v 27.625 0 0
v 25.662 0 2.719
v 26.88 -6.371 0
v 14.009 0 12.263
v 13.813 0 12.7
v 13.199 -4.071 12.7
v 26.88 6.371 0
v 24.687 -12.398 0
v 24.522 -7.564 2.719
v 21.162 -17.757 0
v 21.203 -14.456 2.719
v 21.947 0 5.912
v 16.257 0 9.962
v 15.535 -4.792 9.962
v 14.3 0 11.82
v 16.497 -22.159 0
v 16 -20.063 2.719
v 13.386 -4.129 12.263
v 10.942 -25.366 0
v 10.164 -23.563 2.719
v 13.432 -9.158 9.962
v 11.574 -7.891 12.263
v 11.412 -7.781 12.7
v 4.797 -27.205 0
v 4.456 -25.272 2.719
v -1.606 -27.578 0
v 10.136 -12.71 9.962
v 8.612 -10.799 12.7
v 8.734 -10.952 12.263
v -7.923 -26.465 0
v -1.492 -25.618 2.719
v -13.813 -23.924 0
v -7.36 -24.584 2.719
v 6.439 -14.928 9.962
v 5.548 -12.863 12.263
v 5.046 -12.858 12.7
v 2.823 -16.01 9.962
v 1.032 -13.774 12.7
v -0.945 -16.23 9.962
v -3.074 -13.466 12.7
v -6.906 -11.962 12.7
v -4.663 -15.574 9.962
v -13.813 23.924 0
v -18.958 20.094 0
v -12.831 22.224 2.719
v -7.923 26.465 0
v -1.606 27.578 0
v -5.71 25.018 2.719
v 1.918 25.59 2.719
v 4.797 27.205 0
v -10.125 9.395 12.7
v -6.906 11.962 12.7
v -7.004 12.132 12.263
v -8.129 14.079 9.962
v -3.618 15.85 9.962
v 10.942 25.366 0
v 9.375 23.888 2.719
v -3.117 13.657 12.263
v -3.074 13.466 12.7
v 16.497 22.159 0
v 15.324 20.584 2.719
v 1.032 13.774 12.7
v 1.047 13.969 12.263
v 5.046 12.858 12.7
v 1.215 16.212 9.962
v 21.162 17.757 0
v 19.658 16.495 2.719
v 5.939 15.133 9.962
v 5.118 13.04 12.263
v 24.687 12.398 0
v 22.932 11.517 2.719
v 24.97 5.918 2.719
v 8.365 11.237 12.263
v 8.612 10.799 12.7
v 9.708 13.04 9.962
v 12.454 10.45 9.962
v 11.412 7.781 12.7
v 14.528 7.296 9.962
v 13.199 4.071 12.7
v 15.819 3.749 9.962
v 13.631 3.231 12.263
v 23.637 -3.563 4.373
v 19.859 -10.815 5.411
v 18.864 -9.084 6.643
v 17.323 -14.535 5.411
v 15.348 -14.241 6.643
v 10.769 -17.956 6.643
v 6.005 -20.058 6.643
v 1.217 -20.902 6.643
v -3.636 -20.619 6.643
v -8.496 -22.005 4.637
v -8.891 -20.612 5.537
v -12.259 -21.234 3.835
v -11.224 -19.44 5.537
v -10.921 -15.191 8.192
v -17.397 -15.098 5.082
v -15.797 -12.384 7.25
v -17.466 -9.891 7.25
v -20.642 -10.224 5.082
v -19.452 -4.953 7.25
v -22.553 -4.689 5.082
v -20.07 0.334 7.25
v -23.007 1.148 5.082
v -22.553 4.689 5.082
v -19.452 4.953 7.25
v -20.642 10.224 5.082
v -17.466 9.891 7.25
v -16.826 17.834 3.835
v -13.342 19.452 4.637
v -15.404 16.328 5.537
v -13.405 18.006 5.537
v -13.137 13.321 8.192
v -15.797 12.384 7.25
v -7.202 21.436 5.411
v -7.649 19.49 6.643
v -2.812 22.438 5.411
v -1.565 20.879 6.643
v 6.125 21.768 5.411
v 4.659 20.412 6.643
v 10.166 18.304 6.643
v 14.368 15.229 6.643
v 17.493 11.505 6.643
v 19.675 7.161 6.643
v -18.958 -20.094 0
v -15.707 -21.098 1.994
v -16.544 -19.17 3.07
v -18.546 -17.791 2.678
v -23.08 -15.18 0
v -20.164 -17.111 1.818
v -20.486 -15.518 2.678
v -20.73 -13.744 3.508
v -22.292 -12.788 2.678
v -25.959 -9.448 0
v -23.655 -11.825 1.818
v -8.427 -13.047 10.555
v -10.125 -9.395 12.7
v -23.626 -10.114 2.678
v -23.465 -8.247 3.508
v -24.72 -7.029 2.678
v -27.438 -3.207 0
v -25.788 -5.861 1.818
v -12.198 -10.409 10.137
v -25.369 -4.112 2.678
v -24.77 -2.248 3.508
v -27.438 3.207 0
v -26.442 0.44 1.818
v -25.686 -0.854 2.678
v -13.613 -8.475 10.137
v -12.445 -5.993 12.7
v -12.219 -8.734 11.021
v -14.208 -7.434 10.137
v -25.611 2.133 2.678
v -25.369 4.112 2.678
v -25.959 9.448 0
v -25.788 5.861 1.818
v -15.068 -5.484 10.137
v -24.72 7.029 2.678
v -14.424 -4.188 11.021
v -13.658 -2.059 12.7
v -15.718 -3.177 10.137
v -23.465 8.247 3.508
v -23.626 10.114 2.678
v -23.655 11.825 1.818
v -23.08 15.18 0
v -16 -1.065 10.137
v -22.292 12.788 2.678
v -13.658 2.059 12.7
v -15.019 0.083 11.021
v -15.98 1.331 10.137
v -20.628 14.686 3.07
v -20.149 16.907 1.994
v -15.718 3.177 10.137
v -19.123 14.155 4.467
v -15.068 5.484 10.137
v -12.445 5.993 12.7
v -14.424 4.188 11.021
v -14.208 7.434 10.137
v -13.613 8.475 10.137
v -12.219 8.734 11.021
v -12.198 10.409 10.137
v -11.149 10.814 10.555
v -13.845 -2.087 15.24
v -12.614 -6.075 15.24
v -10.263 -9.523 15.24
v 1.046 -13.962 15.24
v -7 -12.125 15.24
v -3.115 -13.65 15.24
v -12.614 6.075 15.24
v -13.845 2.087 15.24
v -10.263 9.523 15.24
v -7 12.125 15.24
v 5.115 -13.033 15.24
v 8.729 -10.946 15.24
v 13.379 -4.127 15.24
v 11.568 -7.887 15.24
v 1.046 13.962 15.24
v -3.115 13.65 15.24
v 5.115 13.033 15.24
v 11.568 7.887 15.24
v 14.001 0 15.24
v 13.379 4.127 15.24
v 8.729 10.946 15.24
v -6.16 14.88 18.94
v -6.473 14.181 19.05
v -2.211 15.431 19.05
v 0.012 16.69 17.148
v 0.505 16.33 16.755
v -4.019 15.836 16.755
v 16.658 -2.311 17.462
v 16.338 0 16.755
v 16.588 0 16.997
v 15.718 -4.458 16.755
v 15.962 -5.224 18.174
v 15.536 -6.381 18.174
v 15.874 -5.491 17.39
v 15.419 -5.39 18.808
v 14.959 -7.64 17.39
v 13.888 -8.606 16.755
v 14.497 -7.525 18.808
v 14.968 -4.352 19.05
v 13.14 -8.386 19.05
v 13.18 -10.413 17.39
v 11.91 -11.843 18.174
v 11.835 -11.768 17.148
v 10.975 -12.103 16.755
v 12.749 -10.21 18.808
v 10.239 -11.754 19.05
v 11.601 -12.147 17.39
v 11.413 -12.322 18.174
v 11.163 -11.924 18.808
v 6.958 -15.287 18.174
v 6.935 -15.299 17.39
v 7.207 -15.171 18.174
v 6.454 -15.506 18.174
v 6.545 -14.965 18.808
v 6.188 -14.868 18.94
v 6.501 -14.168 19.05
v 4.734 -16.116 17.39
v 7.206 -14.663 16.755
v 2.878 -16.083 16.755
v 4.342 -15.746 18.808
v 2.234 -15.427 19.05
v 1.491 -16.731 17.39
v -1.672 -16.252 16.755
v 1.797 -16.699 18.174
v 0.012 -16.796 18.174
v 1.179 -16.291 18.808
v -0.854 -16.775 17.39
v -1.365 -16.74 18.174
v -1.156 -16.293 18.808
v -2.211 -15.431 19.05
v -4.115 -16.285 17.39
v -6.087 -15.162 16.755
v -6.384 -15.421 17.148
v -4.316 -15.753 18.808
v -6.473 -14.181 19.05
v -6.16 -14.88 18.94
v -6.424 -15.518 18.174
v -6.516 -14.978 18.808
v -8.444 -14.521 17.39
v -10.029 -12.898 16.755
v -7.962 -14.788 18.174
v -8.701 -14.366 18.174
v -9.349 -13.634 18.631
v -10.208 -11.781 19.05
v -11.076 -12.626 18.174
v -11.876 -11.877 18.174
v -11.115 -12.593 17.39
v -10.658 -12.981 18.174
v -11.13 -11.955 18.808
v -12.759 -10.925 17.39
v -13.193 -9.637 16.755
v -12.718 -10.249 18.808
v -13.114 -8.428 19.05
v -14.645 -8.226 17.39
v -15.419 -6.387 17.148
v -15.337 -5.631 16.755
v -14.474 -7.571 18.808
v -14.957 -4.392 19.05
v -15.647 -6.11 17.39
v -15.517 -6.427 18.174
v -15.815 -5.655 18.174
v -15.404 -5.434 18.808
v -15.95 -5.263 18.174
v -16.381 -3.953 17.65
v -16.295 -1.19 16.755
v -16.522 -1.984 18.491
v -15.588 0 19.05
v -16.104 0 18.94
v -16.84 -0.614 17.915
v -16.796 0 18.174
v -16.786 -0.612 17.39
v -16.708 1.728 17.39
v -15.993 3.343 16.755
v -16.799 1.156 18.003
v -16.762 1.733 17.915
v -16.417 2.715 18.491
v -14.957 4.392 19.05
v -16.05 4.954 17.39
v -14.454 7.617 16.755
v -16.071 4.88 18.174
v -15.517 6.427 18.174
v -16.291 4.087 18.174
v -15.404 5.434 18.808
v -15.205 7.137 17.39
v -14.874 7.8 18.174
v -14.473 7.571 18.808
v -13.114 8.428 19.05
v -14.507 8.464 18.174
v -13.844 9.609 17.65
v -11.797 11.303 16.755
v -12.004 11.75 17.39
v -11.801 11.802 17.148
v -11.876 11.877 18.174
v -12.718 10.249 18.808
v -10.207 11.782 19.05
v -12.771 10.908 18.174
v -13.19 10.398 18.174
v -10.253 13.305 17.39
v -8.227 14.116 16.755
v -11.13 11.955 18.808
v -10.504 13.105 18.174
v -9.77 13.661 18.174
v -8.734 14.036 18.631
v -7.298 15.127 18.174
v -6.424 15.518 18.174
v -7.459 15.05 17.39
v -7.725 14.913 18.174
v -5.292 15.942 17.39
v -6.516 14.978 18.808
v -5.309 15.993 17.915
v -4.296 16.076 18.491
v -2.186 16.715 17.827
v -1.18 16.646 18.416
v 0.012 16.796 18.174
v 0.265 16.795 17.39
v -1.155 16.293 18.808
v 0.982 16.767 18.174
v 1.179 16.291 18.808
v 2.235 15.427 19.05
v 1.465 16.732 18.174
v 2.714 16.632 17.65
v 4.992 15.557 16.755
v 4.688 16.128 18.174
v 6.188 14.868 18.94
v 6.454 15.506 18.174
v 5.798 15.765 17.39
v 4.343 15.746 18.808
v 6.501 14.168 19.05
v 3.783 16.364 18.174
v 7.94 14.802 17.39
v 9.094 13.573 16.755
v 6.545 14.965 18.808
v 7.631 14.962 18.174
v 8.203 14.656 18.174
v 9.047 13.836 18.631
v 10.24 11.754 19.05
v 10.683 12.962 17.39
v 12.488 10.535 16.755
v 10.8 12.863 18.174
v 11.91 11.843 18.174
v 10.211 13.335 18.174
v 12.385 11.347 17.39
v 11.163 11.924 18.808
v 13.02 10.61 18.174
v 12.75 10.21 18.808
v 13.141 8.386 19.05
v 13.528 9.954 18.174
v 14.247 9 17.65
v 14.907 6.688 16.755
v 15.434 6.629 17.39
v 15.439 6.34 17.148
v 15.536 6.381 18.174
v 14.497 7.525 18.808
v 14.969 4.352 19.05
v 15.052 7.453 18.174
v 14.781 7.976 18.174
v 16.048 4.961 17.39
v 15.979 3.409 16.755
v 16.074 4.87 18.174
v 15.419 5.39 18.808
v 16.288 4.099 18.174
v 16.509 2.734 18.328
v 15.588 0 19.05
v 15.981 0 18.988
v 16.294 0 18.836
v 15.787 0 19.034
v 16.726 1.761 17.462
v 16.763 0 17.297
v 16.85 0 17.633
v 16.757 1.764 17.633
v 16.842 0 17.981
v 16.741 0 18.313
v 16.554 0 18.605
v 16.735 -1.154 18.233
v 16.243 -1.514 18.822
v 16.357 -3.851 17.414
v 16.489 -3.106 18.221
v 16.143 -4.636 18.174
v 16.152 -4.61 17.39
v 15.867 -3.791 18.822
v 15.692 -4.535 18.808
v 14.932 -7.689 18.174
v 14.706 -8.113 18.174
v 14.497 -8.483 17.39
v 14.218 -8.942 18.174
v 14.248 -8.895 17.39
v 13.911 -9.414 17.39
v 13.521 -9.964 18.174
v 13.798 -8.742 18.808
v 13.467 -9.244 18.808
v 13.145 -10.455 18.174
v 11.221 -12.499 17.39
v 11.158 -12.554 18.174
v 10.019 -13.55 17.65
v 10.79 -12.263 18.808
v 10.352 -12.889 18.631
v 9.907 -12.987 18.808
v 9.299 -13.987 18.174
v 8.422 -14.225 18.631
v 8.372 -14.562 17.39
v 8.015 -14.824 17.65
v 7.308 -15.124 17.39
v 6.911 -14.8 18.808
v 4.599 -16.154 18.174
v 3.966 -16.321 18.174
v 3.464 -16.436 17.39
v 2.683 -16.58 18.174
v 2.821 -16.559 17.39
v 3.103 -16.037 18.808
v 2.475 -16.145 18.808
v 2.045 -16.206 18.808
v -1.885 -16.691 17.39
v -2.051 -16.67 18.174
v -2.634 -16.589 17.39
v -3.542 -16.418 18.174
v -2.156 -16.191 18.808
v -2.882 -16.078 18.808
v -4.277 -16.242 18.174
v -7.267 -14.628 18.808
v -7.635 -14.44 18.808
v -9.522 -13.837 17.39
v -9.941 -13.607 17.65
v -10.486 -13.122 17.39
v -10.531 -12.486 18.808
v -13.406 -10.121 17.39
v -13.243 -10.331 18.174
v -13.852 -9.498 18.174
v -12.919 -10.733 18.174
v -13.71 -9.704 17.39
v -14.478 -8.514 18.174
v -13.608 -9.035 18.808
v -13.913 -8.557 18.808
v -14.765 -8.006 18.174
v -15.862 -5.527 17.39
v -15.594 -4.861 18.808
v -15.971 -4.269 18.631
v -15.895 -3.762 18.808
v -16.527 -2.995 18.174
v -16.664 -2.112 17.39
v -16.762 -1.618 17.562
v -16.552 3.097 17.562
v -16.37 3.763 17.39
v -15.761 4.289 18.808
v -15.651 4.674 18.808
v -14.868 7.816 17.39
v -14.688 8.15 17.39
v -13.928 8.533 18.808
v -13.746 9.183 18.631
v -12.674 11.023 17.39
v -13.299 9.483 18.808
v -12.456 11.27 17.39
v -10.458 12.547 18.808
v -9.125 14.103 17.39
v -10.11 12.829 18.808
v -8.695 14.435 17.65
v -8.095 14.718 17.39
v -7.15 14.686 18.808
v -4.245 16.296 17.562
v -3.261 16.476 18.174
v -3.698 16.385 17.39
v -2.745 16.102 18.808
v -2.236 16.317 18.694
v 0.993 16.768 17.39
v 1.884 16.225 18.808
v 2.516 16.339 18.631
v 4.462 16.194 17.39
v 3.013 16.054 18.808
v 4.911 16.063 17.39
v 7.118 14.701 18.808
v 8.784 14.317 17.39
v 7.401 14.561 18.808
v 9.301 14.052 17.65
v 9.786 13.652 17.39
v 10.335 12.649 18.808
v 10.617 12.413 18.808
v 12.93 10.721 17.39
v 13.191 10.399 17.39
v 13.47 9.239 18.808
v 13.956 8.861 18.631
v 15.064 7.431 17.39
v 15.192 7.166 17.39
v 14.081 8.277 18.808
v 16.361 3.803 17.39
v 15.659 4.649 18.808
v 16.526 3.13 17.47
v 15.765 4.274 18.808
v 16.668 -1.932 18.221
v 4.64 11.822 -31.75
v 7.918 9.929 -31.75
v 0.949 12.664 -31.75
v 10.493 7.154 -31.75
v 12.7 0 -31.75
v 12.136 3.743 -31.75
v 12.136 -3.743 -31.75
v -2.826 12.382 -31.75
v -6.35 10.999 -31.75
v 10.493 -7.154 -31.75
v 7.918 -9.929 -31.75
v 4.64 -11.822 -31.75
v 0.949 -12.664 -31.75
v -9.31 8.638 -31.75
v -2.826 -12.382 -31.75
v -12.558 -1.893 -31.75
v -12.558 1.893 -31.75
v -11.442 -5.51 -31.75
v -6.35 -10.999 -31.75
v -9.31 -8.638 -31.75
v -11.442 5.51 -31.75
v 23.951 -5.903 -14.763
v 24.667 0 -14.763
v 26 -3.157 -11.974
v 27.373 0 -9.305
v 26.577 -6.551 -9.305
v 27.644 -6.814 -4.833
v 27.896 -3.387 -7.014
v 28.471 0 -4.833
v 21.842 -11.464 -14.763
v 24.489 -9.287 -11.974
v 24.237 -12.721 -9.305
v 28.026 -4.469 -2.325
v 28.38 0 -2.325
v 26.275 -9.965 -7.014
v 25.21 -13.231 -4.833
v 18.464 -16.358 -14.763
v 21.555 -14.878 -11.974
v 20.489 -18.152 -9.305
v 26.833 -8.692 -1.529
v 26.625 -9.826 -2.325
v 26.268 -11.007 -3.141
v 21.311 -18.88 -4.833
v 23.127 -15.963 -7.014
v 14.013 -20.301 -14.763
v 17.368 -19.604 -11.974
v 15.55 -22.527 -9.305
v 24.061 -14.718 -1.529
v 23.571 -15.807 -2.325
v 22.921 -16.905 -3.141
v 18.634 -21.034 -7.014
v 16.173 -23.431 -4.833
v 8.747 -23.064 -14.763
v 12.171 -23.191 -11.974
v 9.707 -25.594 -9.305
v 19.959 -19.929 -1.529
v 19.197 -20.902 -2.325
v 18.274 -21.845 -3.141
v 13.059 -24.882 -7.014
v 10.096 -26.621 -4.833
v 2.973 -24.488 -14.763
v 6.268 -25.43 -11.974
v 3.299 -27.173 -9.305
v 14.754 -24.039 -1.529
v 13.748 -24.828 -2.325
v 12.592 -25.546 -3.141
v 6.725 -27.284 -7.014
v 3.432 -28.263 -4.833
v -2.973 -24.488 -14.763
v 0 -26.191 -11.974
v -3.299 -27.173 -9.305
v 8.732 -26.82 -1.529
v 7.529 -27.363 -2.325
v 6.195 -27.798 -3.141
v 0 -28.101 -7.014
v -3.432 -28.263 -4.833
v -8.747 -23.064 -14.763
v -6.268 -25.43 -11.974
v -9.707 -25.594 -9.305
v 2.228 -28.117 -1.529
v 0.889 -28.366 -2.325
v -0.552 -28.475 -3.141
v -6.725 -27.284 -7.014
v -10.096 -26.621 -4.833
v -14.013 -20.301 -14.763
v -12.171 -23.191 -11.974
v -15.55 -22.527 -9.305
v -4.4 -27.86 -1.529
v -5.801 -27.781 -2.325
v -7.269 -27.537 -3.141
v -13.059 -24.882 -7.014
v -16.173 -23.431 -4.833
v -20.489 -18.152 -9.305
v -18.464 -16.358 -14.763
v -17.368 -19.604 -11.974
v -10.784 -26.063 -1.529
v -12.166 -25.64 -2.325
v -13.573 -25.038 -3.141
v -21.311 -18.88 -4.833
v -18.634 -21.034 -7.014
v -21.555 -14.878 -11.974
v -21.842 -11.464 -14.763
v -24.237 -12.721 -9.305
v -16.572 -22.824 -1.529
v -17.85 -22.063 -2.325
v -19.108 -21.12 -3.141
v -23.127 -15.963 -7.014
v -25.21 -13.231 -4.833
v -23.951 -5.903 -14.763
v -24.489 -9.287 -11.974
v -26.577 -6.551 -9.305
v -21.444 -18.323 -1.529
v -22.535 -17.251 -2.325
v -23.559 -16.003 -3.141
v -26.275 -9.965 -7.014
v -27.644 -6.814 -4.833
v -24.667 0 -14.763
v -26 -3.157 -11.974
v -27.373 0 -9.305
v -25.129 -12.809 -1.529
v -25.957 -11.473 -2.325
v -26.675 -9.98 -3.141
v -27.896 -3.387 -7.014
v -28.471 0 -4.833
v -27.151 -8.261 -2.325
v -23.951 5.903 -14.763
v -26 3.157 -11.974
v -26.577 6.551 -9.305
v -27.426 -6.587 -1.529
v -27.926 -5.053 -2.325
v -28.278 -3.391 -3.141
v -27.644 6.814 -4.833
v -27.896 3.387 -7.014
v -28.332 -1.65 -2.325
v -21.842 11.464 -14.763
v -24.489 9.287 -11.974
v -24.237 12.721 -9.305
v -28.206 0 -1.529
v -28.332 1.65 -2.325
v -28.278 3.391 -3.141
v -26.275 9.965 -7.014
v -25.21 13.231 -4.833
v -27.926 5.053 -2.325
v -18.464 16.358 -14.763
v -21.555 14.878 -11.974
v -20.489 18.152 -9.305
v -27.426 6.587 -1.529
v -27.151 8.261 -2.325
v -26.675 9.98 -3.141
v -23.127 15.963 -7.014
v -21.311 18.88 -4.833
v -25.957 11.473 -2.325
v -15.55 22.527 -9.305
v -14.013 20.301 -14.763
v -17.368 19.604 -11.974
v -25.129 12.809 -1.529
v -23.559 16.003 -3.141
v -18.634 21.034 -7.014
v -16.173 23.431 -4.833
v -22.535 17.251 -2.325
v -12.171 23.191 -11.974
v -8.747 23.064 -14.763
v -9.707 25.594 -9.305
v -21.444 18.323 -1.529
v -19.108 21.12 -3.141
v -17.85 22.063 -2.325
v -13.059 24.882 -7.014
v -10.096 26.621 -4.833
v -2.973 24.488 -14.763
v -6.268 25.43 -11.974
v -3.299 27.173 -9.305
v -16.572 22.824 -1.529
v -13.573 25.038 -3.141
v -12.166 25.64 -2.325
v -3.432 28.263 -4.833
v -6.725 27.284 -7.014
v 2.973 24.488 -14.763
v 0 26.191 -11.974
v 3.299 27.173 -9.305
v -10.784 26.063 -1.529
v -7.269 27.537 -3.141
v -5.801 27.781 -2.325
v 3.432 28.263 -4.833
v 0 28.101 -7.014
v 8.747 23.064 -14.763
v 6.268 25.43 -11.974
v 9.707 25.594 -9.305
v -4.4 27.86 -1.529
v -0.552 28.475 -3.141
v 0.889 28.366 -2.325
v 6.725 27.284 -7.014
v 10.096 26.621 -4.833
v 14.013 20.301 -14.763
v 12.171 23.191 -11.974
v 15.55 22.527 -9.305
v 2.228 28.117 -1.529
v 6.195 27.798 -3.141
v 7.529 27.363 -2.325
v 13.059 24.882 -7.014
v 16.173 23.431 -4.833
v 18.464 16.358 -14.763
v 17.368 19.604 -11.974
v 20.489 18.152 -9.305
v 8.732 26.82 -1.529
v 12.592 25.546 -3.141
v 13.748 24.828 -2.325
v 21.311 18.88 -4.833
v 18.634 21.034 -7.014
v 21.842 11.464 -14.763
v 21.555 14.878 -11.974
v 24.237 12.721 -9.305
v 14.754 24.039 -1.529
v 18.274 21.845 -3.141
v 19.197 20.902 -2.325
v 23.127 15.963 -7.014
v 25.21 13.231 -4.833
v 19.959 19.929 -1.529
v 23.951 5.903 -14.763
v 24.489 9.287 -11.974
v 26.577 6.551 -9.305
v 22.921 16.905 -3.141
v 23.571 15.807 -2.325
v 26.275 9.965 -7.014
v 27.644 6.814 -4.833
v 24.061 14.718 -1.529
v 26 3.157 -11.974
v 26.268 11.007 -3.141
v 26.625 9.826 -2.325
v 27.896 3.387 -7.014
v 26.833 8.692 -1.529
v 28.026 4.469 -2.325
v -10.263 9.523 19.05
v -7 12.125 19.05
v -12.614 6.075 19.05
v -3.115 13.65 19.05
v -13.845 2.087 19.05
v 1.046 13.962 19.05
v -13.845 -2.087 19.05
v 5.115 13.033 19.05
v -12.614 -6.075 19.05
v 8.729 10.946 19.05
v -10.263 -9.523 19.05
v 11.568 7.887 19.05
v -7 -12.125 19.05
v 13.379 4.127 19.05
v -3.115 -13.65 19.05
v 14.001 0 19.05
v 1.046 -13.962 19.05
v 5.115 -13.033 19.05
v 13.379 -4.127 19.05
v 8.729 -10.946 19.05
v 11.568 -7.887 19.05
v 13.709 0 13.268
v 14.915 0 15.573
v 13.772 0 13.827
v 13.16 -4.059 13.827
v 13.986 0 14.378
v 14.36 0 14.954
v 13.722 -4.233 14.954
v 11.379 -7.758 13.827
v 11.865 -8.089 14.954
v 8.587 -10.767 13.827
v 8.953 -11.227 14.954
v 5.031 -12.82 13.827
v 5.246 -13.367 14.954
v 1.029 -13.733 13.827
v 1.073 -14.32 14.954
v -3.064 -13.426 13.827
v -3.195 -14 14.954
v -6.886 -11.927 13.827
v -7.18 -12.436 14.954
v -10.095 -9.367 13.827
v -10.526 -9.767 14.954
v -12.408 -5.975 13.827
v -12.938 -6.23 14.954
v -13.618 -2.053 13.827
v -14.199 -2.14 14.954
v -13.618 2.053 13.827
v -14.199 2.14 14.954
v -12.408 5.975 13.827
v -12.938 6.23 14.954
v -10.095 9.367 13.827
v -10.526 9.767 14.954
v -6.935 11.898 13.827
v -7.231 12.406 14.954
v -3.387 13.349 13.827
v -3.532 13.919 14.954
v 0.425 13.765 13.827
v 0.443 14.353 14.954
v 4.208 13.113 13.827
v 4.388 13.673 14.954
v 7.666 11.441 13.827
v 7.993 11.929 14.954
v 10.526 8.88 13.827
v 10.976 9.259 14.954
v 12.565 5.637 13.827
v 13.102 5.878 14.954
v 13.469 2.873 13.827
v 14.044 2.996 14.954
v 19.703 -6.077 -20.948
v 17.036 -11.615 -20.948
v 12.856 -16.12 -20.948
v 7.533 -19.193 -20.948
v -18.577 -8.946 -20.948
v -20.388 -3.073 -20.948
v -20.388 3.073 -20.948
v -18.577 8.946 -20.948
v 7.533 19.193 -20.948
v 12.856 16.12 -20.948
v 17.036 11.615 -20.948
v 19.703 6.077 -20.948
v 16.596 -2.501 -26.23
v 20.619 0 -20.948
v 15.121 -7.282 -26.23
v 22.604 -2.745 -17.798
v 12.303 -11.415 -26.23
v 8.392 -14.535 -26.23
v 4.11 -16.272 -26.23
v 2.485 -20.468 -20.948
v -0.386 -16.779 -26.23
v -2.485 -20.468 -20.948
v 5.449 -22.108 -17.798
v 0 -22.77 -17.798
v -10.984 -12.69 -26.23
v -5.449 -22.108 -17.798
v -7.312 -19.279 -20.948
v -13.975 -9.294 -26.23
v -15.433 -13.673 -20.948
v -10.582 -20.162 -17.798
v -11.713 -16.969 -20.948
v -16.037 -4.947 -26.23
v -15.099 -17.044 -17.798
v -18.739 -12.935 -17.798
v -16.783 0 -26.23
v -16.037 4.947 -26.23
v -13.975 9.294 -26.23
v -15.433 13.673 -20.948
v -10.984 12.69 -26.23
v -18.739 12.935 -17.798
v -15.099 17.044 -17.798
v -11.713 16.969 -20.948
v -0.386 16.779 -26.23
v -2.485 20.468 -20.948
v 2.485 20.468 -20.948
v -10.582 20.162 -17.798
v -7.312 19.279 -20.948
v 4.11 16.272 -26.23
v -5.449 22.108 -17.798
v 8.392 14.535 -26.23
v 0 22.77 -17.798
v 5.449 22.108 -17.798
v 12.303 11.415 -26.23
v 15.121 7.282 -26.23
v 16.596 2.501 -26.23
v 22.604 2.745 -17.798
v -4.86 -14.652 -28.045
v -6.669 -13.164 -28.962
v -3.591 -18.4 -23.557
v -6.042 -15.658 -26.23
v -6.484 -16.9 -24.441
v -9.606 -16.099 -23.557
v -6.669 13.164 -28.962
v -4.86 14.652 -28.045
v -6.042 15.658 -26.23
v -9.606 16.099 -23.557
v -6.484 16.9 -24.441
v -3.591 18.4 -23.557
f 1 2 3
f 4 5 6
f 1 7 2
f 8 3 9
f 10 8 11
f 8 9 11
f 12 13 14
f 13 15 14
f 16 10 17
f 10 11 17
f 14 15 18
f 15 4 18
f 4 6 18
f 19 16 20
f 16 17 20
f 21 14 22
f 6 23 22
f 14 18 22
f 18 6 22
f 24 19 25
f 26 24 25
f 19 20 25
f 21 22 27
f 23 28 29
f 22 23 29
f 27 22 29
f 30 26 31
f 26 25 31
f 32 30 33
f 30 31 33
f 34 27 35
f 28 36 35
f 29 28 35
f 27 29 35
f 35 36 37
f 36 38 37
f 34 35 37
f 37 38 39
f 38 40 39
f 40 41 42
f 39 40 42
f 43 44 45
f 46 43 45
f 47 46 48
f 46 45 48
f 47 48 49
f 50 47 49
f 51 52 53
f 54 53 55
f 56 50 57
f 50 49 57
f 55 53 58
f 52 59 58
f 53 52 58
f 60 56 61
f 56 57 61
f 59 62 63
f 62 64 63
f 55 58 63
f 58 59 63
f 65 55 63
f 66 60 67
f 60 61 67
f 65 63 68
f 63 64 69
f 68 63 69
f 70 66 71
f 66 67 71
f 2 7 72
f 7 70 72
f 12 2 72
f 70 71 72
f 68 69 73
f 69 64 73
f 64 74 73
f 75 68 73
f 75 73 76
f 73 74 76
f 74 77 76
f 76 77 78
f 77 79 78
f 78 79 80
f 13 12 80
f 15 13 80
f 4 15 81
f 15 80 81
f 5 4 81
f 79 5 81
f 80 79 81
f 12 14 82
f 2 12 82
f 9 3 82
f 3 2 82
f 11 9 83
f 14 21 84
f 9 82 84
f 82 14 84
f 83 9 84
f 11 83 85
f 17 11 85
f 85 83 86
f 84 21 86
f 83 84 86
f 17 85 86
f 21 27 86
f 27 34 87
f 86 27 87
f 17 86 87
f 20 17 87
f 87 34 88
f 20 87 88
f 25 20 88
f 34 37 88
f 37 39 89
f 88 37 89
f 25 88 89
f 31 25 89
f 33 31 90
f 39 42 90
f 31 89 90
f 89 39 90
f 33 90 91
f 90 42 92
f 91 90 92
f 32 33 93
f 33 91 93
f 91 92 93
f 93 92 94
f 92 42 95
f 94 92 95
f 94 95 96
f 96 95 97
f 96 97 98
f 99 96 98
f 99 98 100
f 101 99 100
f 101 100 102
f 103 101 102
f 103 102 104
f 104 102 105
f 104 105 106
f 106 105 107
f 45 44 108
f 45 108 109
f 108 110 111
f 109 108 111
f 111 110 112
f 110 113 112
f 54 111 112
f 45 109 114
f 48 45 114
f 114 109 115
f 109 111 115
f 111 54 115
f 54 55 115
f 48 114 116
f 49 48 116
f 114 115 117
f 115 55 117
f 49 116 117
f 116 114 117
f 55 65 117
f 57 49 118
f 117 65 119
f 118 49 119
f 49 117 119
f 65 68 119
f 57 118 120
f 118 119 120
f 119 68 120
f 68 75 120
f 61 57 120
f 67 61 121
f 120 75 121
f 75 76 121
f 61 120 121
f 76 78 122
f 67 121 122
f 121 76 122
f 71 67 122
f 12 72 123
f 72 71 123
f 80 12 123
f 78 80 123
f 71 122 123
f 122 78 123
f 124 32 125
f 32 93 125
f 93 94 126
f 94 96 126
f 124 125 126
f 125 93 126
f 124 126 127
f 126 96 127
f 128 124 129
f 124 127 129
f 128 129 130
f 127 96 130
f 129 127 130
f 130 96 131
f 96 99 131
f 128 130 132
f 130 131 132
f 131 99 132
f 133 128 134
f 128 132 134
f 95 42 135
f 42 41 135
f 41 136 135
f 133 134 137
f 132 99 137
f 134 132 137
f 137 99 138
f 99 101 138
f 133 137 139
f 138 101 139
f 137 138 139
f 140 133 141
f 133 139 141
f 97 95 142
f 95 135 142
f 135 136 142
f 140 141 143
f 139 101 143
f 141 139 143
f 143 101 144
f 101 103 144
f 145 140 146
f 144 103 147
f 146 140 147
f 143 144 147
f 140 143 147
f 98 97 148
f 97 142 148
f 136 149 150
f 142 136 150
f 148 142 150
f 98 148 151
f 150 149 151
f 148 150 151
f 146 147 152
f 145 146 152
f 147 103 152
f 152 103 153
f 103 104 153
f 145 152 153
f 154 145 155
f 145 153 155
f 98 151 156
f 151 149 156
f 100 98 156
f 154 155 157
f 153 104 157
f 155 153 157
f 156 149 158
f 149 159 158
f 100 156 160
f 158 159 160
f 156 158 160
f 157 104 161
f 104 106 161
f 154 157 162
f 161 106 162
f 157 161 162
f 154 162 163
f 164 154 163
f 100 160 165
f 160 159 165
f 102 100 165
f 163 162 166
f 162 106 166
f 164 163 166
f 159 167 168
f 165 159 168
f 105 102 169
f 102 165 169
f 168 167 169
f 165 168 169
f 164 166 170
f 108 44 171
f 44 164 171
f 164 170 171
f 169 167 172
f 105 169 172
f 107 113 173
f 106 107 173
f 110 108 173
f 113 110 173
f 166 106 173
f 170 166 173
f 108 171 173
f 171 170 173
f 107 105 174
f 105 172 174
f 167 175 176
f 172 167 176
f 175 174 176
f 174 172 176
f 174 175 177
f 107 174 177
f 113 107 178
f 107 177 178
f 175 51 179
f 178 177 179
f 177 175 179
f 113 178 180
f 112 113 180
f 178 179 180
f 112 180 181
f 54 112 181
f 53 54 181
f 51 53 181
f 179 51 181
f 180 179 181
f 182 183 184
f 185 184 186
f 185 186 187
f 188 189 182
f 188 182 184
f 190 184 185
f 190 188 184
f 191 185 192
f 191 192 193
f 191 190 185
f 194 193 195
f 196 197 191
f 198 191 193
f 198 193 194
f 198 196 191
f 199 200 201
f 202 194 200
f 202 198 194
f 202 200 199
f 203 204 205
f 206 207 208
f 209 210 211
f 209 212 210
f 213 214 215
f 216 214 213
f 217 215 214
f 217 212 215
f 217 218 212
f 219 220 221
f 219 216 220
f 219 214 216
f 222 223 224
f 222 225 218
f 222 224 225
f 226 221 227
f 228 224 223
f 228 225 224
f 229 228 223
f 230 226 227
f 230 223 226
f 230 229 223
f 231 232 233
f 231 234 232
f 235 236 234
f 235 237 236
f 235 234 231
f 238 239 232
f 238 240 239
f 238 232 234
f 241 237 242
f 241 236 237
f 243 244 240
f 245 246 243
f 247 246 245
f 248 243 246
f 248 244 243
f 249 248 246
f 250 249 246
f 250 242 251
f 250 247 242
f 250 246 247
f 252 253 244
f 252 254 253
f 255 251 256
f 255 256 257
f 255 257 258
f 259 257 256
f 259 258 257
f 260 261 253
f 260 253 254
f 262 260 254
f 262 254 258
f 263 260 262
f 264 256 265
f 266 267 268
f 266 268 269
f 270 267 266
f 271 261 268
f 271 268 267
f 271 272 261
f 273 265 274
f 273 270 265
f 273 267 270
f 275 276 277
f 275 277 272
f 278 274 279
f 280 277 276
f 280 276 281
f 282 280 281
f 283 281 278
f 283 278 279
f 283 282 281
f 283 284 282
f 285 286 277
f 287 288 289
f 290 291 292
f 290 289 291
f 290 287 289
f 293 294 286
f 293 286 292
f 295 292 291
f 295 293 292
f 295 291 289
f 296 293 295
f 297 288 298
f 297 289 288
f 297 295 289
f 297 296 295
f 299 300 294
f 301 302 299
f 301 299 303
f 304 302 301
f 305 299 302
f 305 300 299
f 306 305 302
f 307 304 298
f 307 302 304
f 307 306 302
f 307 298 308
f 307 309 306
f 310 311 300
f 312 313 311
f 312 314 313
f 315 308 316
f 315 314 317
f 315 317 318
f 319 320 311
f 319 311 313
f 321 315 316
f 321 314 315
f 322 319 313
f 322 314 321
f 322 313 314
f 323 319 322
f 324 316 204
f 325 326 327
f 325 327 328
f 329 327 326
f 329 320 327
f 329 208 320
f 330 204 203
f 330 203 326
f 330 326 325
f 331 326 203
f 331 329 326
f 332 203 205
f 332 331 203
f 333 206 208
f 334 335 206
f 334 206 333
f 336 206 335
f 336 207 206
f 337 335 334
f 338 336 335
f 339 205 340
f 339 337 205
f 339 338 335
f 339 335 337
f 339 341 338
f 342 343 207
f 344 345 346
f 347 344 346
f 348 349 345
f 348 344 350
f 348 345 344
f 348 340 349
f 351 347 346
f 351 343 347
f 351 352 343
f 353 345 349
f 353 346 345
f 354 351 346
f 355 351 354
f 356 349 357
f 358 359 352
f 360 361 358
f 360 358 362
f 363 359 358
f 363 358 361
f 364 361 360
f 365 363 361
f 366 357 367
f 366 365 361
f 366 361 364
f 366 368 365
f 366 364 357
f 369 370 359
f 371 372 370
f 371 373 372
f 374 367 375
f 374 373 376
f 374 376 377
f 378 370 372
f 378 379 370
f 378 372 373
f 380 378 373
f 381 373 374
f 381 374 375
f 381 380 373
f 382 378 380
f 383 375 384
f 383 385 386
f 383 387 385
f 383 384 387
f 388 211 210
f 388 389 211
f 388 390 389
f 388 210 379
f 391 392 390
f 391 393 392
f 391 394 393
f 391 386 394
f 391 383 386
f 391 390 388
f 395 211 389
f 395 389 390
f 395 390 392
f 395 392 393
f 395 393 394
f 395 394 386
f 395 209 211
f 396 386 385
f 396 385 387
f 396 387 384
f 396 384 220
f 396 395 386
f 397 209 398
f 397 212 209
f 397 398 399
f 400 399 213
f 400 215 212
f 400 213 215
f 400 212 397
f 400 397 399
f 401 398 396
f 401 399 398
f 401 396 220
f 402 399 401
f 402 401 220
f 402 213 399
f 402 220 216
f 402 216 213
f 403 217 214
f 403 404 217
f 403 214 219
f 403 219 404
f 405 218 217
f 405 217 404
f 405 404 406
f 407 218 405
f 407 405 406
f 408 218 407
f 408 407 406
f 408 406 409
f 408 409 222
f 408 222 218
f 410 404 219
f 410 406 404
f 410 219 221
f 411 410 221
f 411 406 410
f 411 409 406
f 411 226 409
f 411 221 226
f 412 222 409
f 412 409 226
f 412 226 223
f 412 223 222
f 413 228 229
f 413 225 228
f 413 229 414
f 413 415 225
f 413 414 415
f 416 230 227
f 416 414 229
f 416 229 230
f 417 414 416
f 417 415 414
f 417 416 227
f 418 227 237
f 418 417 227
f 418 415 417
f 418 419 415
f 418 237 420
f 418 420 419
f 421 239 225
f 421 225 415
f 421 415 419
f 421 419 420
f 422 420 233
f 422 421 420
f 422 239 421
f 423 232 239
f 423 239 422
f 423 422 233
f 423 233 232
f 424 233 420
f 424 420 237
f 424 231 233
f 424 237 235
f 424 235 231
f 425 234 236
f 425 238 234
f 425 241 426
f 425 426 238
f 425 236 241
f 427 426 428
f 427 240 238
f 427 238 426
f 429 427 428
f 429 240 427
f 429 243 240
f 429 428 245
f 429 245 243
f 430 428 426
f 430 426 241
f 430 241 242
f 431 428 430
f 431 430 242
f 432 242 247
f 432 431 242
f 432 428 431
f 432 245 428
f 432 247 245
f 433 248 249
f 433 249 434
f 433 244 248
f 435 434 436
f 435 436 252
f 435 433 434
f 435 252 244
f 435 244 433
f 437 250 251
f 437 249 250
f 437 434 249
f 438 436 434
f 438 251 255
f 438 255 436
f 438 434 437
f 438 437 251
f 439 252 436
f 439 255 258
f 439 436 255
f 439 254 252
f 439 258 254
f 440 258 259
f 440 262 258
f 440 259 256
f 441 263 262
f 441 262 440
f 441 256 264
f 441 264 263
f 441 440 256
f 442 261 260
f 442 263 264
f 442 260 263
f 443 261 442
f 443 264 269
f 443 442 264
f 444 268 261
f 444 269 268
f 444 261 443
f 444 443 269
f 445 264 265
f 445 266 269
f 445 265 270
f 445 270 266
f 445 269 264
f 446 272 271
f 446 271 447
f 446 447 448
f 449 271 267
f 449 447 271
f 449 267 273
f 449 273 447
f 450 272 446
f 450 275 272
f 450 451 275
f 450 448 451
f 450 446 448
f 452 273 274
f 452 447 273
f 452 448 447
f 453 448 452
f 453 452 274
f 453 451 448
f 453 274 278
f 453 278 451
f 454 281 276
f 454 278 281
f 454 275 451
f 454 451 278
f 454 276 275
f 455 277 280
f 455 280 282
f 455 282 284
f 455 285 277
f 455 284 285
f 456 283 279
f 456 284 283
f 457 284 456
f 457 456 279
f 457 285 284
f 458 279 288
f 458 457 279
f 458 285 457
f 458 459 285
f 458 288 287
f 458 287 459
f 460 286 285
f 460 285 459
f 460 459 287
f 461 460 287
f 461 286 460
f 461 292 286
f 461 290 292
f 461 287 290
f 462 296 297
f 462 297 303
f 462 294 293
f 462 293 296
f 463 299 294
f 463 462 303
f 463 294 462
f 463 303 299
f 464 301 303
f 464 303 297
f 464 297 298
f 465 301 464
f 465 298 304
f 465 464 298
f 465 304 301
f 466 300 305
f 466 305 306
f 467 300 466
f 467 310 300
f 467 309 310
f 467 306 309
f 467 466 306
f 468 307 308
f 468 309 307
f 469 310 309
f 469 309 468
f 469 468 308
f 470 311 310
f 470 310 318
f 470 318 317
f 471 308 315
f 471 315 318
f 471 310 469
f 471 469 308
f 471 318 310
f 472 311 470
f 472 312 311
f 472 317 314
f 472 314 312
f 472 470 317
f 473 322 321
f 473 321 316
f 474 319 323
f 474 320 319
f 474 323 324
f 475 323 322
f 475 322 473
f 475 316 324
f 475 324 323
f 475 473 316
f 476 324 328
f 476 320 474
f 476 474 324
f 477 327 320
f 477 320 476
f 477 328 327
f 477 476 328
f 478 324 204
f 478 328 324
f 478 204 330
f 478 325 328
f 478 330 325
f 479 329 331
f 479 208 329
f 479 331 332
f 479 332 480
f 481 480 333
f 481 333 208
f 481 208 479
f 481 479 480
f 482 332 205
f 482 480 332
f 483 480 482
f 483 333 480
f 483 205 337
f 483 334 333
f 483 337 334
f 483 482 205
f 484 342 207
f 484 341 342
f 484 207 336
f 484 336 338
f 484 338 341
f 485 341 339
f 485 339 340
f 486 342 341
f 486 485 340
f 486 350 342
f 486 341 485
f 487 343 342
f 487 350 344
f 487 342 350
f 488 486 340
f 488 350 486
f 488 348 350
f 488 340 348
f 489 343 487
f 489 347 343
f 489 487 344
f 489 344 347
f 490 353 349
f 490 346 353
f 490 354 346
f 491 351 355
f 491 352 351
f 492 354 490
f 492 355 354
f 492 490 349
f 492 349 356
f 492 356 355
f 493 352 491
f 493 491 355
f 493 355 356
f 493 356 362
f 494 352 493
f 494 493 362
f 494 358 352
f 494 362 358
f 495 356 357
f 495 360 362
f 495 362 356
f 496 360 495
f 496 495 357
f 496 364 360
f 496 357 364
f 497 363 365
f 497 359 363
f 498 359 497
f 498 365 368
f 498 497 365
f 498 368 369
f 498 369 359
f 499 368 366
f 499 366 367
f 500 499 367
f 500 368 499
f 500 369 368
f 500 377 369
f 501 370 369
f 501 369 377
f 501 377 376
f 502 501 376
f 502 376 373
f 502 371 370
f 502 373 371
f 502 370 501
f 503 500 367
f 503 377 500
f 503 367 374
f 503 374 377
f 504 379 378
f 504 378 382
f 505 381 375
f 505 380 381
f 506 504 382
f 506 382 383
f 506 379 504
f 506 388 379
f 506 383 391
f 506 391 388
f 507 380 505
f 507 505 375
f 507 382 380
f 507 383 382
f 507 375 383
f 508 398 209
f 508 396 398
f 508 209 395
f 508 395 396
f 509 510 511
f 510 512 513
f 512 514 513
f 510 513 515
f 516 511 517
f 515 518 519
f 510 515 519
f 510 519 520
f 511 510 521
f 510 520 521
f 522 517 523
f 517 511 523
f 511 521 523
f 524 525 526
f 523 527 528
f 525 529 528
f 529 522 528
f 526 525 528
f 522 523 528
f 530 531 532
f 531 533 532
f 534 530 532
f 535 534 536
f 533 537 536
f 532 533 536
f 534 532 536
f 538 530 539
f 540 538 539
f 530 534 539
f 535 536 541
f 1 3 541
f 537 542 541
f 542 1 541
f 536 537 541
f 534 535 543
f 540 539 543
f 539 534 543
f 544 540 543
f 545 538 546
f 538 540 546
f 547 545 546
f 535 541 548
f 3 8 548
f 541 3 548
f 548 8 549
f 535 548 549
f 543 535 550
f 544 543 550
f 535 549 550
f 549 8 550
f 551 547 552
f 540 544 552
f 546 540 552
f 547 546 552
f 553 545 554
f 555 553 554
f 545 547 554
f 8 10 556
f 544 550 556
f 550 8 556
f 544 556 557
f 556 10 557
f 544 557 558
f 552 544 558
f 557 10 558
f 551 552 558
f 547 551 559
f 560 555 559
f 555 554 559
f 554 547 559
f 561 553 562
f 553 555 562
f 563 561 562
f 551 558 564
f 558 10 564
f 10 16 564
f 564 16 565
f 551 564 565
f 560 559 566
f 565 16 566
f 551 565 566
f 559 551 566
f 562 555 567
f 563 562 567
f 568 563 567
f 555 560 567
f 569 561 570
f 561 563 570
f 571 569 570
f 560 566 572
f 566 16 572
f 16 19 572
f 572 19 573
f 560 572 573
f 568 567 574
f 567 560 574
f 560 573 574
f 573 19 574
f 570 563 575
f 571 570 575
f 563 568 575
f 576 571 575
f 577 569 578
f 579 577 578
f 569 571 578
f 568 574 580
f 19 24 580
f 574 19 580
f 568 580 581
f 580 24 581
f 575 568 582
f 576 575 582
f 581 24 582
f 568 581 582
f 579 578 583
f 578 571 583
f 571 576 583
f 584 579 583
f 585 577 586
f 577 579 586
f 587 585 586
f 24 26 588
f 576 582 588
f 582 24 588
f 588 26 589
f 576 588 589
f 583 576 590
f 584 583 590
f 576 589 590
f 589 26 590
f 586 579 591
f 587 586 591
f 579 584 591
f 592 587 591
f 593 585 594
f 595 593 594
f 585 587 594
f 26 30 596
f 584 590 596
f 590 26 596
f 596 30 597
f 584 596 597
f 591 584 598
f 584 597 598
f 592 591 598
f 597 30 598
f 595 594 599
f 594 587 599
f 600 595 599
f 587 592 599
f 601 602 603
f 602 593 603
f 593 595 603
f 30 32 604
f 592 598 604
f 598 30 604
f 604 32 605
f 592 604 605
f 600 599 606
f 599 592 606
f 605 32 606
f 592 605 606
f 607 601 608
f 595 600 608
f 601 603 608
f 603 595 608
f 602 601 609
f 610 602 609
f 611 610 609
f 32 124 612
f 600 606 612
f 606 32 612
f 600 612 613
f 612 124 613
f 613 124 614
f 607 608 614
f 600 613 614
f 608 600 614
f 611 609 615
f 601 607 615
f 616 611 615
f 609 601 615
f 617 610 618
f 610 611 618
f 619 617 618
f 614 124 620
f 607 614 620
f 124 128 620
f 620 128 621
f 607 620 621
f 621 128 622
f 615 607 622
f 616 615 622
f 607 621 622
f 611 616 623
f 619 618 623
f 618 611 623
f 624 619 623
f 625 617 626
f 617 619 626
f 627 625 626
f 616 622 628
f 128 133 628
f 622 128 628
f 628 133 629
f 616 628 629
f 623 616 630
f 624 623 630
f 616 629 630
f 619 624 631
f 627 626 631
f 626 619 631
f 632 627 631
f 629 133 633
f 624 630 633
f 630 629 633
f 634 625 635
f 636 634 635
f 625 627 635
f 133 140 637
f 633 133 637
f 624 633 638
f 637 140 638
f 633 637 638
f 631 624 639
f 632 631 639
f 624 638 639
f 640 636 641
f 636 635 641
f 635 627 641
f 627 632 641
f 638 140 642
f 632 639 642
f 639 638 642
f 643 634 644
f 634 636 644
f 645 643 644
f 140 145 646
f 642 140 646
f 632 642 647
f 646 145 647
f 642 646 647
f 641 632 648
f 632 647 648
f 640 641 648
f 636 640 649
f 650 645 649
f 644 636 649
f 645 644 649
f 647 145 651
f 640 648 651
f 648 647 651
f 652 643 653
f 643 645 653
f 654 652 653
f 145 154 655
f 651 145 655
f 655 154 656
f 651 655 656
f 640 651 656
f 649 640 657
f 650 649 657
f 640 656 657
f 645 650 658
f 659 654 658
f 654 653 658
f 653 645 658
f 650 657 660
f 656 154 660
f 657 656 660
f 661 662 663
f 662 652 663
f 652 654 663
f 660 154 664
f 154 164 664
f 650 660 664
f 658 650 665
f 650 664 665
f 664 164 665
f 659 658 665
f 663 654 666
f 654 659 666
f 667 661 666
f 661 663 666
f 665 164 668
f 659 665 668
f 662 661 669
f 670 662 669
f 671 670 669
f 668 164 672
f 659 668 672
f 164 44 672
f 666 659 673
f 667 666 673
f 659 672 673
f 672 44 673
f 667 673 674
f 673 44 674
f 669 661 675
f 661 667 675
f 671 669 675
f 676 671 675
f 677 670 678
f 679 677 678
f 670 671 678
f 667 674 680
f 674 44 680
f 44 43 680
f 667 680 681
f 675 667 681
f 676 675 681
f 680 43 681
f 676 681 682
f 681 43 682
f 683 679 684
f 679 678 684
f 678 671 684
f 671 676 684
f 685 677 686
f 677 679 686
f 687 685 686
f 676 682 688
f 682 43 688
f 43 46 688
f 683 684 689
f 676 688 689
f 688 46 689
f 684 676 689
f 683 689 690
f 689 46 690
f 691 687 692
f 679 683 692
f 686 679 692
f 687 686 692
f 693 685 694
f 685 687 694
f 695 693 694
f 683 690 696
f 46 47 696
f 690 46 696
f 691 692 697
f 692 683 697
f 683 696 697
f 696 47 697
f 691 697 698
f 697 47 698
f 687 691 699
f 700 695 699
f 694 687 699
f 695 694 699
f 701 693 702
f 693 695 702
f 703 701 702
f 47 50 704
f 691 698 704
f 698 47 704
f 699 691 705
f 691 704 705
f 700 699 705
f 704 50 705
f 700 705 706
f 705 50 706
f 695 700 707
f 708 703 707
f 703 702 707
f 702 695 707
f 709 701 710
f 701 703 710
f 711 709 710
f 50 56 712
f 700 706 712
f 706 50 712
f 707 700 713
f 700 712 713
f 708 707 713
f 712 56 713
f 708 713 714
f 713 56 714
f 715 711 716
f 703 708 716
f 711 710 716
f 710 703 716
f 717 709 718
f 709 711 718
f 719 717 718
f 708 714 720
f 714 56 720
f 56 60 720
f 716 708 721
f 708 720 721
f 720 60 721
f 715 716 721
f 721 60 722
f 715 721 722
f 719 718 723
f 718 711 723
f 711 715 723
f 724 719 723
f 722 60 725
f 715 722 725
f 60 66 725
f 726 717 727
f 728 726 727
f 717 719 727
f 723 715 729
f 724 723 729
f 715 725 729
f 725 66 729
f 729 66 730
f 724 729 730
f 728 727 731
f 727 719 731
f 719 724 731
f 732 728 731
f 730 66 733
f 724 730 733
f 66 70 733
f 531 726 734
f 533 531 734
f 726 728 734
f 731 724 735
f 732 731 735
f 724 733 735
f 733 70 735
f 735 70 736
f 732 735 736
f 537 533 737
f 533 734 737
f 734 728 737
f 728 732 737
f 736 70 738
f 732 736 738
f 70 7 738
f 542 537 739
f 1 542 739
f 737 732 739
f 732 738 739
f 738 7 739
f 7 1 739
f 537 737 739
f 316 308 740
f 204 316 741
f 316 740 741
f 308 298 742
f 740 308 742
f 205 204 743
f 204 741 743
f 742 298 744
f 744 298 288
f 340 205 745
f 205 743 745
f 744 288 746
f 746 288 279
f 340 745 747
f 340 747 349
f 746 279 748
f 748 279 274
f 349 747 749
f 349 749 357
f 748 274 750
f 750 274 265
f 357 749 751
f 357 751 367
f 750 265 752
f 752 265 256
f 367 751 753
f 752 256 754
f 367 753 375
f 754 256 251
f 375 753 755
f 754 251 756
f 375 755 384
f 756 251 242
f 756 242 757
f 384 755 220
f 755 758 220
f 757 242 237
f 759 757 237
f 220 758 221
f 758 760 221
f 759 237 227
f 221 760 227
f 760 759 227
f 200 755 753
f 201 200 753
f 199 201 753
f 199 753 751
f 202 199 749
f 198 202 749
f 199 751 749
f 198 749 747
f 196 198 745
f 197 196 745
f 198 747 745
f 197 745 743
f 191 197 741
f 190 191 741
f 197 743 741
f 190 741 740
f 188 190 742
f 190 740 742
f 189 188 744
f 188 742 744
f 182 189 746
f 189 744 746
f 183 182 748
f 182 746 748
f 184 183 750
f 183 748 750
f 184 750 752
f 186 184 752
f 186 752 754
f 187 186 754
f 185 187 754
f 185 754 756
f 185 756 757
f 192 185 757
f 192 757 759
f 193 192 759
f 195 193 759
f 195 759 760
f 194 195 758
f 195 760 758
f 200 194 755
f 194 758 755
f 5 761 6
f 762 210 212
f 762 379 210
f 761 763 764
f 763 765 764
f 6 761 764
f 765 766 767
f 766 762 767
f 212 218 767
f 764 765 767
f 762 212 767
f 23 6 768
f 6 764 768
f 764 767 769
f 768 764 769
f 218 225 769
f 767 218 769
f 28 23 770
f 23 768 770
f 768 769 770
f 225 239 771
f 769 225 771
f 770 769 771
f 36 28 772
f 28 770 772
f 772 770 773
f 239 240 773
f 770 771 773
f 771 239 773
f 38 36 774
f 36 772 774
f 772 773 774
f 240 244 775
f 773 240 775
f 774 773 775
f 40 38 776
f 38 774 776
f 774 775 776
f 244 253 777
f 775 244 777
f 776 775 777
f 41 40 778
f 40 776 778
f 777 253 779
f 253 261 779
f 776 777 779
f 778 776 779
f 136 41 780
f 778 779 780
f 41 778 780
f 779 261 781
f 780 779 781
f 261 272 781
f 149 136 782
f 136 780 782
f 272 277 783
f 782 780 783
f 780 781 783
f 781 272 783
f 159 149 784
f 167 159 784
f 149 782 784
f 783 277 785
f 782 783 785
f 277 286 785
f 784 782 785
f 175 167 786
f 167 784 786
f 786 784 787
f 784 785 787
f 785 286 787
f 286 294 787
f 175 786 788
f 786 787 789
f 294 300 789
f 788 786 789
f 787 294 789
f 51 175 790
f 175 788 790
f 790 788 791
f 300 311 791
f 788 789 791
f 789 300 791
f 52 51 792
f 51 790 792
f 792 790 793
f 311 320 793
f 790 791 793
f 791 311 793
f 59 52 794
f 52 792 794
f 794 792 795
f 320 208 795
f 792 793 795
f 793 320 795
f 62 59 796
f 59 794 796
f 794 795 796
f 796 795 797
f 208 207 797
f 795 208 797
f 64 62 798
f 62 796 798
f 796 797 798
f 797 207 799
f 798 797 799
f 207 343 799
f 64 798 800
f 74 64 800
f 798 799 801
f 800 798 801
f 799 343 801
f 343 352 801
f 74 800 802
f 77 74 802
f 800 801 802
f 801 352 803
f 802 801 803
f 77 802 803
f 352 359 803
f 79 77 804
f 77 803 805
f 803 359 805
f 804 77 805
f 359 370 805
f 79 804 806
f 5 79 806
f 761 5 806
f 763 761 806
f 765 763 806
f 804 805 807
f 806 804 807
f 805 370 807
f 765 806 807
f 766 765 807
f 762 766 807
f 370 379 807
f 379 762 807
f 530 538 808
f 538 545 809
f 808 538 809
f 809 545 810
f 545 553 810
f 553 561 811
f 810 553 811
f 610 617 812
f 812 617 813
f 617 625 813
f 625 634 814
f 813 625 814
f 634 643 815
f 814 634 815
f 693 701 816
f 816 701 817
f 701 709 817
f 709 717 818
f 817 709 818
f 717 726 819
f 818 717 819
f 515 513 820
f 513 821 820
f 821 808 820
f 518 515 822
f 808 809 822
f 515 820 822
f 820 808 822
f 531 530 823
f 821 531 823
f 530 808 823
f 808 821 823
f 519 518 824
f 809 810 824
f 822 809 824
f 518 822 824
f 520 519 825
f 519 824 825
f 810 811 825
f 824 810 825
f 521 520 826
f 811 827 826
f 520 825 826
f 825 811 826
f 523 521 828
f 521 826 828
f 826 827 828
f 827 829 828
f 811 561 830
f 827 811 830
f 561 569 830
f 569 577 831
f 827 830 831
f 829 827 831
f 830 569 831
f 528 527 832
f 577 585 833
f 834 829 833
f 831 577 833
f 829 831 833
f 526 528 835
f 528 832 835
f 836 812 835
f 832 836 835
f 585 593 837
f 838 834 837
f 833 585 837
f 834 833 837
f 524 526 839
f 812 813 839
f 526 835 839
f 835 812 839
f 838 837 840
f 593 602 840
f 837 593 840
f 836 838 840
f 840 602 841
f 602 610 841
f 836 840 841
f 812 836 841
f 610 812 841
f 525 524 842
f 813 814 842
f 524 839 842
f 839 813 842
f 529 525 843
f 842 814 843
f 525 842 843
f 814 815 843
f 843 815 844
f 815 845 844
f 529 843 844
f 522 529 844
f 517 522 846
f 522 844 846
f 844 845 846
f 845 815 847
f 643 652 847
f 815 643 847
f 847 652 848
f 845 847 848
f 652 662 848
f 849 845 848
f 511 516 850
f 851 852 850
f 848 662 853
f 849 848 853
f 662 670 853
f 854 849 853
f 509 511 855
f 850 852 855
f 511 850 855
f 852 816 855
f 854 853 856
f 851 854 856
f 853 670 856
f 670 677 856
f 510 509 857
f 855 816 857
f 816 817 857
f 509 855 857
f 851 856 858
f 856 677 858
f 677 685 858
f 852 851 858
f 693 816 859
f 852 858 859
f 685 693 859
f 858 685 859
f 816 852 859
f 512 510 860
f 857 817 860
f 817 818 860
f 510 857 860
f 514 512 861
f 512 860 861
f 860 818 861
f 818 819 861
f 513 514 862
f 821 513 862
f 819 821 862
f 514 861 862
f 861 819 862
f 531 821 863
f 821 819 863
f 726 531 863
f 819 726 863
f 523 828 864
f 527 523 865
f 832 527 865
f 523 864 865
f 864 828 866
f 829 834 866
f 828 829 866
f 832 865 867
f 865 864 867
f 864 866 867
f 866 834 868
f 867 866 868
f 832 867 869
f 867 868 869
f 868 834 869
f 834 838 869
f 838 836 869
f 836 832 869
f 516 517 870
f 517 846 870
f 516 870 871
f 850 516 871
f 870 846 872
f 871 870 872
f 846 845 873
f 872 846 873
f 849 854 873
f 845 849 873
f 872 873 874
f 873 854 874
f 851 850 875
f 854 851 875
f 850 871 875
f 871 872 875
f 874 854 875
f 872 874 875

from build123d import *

# Parameters (mm, degrees)
F2_R     = 1.27
F3_R     = 14.0009089704
F4_DEPTH = 3.81


with BuildPart() as f1:
    # F0 (on Front) → F1 (revolve)
    with BuildSketch(Plane.XZ):
        with BuildLine():
            Line((0, 19.05), (0, 12.7))
            Line((0, 12.7), (13.8125655637, 12.7))
            add(Edge.make_bspline(
                [(13.8125655637, 12.7), (13.0663921948, 14.9251647648), (16.4344619114, 16.9022058016), (19.847298041, 19.05)],
                knots=[0.7760230667, 0.7760230667, 0.7760230667, 0.7760230667, 1, 1, 1, 1], degree=3))
            Line((19.847298041, 19.05), (0, 19.05))
        make_face()
        with BuildLine():
            Line((0, 12.7), (0, 0))
            Line((0, 0), (27.6251311274, 0))
            add(Edge.make_bspline(
                [(27.6251311274, 0), (24.8091136566, 5.6553197035), (14.9046167578, 9.4433924344), (13.8125655637, 12.7)],
                knots=[0.4482248798, 0.4482248798, 0.4482248798, 0.4482248798, 0.7760230667, 0.7760230667, 0.7760230667, 0.7760230667], degree=3))
            Line((13.8125655637, 12.7), (0, 12.7))
        make_face()
        with BuildLine():
            Line((0, 0), (0, -14.7634614258))
            Line((0, -14.7634614258), (24.6674361824, -14.7634614258))
            add(Edge.make_bspline(
                [(24.6674361824, -14.7634614258), (28.0198990008, -9.0674738483), (29.6437756284, -4.0539805378), (27.6251311274, 0)],
                knots=[0.2132448009, 0.2132448009, 0.2132448009, 0.2132448009, 0.4482248798, 0.4482248798, 0.4482248798, 0.4482248798], degree=3))
            Line((27.6251311274, 0), (0, 0))
        make_face()
        with BuildLine():
            Line((0, -14.7634614258), (0, -31.75))
            Line((0, -31.75), (12.7, -31.75))
            add(Edge.make_bspline(
                [(12.7, -31.75), (17.1591123173, -25.6637716878), (21.6250707627, -19.9325793474), (24.6674361824, -14.7634614258)],
                knots=[0, 0, 0, 0, 0.2132448009, 0.2132448009, 0.2132448009, 0.2132448009], degree=3))
            Line((24.6674361824, -14.7634614258), (0, -14.7634614258))
        make_face()
    revolve(axis=Axis((0, 0, 15.875), (0, 0, -1)))

    # F2
    f2_edges = [f1.edges().sort_by_distance(p)[0] for p in [
        (-19.847298, 0, 19.05),
    ]]
    fillet(f2_edges, radius=F2_R)

    # F3 (on face) → F4 (cut)
    with BuildSketch(Plane.XY.offset(19.05)):
        Circle(F3_R)
    extrude(amount=-F4_DEPTH, mode=Mode.SUBTRACT)


solid = f1.part
